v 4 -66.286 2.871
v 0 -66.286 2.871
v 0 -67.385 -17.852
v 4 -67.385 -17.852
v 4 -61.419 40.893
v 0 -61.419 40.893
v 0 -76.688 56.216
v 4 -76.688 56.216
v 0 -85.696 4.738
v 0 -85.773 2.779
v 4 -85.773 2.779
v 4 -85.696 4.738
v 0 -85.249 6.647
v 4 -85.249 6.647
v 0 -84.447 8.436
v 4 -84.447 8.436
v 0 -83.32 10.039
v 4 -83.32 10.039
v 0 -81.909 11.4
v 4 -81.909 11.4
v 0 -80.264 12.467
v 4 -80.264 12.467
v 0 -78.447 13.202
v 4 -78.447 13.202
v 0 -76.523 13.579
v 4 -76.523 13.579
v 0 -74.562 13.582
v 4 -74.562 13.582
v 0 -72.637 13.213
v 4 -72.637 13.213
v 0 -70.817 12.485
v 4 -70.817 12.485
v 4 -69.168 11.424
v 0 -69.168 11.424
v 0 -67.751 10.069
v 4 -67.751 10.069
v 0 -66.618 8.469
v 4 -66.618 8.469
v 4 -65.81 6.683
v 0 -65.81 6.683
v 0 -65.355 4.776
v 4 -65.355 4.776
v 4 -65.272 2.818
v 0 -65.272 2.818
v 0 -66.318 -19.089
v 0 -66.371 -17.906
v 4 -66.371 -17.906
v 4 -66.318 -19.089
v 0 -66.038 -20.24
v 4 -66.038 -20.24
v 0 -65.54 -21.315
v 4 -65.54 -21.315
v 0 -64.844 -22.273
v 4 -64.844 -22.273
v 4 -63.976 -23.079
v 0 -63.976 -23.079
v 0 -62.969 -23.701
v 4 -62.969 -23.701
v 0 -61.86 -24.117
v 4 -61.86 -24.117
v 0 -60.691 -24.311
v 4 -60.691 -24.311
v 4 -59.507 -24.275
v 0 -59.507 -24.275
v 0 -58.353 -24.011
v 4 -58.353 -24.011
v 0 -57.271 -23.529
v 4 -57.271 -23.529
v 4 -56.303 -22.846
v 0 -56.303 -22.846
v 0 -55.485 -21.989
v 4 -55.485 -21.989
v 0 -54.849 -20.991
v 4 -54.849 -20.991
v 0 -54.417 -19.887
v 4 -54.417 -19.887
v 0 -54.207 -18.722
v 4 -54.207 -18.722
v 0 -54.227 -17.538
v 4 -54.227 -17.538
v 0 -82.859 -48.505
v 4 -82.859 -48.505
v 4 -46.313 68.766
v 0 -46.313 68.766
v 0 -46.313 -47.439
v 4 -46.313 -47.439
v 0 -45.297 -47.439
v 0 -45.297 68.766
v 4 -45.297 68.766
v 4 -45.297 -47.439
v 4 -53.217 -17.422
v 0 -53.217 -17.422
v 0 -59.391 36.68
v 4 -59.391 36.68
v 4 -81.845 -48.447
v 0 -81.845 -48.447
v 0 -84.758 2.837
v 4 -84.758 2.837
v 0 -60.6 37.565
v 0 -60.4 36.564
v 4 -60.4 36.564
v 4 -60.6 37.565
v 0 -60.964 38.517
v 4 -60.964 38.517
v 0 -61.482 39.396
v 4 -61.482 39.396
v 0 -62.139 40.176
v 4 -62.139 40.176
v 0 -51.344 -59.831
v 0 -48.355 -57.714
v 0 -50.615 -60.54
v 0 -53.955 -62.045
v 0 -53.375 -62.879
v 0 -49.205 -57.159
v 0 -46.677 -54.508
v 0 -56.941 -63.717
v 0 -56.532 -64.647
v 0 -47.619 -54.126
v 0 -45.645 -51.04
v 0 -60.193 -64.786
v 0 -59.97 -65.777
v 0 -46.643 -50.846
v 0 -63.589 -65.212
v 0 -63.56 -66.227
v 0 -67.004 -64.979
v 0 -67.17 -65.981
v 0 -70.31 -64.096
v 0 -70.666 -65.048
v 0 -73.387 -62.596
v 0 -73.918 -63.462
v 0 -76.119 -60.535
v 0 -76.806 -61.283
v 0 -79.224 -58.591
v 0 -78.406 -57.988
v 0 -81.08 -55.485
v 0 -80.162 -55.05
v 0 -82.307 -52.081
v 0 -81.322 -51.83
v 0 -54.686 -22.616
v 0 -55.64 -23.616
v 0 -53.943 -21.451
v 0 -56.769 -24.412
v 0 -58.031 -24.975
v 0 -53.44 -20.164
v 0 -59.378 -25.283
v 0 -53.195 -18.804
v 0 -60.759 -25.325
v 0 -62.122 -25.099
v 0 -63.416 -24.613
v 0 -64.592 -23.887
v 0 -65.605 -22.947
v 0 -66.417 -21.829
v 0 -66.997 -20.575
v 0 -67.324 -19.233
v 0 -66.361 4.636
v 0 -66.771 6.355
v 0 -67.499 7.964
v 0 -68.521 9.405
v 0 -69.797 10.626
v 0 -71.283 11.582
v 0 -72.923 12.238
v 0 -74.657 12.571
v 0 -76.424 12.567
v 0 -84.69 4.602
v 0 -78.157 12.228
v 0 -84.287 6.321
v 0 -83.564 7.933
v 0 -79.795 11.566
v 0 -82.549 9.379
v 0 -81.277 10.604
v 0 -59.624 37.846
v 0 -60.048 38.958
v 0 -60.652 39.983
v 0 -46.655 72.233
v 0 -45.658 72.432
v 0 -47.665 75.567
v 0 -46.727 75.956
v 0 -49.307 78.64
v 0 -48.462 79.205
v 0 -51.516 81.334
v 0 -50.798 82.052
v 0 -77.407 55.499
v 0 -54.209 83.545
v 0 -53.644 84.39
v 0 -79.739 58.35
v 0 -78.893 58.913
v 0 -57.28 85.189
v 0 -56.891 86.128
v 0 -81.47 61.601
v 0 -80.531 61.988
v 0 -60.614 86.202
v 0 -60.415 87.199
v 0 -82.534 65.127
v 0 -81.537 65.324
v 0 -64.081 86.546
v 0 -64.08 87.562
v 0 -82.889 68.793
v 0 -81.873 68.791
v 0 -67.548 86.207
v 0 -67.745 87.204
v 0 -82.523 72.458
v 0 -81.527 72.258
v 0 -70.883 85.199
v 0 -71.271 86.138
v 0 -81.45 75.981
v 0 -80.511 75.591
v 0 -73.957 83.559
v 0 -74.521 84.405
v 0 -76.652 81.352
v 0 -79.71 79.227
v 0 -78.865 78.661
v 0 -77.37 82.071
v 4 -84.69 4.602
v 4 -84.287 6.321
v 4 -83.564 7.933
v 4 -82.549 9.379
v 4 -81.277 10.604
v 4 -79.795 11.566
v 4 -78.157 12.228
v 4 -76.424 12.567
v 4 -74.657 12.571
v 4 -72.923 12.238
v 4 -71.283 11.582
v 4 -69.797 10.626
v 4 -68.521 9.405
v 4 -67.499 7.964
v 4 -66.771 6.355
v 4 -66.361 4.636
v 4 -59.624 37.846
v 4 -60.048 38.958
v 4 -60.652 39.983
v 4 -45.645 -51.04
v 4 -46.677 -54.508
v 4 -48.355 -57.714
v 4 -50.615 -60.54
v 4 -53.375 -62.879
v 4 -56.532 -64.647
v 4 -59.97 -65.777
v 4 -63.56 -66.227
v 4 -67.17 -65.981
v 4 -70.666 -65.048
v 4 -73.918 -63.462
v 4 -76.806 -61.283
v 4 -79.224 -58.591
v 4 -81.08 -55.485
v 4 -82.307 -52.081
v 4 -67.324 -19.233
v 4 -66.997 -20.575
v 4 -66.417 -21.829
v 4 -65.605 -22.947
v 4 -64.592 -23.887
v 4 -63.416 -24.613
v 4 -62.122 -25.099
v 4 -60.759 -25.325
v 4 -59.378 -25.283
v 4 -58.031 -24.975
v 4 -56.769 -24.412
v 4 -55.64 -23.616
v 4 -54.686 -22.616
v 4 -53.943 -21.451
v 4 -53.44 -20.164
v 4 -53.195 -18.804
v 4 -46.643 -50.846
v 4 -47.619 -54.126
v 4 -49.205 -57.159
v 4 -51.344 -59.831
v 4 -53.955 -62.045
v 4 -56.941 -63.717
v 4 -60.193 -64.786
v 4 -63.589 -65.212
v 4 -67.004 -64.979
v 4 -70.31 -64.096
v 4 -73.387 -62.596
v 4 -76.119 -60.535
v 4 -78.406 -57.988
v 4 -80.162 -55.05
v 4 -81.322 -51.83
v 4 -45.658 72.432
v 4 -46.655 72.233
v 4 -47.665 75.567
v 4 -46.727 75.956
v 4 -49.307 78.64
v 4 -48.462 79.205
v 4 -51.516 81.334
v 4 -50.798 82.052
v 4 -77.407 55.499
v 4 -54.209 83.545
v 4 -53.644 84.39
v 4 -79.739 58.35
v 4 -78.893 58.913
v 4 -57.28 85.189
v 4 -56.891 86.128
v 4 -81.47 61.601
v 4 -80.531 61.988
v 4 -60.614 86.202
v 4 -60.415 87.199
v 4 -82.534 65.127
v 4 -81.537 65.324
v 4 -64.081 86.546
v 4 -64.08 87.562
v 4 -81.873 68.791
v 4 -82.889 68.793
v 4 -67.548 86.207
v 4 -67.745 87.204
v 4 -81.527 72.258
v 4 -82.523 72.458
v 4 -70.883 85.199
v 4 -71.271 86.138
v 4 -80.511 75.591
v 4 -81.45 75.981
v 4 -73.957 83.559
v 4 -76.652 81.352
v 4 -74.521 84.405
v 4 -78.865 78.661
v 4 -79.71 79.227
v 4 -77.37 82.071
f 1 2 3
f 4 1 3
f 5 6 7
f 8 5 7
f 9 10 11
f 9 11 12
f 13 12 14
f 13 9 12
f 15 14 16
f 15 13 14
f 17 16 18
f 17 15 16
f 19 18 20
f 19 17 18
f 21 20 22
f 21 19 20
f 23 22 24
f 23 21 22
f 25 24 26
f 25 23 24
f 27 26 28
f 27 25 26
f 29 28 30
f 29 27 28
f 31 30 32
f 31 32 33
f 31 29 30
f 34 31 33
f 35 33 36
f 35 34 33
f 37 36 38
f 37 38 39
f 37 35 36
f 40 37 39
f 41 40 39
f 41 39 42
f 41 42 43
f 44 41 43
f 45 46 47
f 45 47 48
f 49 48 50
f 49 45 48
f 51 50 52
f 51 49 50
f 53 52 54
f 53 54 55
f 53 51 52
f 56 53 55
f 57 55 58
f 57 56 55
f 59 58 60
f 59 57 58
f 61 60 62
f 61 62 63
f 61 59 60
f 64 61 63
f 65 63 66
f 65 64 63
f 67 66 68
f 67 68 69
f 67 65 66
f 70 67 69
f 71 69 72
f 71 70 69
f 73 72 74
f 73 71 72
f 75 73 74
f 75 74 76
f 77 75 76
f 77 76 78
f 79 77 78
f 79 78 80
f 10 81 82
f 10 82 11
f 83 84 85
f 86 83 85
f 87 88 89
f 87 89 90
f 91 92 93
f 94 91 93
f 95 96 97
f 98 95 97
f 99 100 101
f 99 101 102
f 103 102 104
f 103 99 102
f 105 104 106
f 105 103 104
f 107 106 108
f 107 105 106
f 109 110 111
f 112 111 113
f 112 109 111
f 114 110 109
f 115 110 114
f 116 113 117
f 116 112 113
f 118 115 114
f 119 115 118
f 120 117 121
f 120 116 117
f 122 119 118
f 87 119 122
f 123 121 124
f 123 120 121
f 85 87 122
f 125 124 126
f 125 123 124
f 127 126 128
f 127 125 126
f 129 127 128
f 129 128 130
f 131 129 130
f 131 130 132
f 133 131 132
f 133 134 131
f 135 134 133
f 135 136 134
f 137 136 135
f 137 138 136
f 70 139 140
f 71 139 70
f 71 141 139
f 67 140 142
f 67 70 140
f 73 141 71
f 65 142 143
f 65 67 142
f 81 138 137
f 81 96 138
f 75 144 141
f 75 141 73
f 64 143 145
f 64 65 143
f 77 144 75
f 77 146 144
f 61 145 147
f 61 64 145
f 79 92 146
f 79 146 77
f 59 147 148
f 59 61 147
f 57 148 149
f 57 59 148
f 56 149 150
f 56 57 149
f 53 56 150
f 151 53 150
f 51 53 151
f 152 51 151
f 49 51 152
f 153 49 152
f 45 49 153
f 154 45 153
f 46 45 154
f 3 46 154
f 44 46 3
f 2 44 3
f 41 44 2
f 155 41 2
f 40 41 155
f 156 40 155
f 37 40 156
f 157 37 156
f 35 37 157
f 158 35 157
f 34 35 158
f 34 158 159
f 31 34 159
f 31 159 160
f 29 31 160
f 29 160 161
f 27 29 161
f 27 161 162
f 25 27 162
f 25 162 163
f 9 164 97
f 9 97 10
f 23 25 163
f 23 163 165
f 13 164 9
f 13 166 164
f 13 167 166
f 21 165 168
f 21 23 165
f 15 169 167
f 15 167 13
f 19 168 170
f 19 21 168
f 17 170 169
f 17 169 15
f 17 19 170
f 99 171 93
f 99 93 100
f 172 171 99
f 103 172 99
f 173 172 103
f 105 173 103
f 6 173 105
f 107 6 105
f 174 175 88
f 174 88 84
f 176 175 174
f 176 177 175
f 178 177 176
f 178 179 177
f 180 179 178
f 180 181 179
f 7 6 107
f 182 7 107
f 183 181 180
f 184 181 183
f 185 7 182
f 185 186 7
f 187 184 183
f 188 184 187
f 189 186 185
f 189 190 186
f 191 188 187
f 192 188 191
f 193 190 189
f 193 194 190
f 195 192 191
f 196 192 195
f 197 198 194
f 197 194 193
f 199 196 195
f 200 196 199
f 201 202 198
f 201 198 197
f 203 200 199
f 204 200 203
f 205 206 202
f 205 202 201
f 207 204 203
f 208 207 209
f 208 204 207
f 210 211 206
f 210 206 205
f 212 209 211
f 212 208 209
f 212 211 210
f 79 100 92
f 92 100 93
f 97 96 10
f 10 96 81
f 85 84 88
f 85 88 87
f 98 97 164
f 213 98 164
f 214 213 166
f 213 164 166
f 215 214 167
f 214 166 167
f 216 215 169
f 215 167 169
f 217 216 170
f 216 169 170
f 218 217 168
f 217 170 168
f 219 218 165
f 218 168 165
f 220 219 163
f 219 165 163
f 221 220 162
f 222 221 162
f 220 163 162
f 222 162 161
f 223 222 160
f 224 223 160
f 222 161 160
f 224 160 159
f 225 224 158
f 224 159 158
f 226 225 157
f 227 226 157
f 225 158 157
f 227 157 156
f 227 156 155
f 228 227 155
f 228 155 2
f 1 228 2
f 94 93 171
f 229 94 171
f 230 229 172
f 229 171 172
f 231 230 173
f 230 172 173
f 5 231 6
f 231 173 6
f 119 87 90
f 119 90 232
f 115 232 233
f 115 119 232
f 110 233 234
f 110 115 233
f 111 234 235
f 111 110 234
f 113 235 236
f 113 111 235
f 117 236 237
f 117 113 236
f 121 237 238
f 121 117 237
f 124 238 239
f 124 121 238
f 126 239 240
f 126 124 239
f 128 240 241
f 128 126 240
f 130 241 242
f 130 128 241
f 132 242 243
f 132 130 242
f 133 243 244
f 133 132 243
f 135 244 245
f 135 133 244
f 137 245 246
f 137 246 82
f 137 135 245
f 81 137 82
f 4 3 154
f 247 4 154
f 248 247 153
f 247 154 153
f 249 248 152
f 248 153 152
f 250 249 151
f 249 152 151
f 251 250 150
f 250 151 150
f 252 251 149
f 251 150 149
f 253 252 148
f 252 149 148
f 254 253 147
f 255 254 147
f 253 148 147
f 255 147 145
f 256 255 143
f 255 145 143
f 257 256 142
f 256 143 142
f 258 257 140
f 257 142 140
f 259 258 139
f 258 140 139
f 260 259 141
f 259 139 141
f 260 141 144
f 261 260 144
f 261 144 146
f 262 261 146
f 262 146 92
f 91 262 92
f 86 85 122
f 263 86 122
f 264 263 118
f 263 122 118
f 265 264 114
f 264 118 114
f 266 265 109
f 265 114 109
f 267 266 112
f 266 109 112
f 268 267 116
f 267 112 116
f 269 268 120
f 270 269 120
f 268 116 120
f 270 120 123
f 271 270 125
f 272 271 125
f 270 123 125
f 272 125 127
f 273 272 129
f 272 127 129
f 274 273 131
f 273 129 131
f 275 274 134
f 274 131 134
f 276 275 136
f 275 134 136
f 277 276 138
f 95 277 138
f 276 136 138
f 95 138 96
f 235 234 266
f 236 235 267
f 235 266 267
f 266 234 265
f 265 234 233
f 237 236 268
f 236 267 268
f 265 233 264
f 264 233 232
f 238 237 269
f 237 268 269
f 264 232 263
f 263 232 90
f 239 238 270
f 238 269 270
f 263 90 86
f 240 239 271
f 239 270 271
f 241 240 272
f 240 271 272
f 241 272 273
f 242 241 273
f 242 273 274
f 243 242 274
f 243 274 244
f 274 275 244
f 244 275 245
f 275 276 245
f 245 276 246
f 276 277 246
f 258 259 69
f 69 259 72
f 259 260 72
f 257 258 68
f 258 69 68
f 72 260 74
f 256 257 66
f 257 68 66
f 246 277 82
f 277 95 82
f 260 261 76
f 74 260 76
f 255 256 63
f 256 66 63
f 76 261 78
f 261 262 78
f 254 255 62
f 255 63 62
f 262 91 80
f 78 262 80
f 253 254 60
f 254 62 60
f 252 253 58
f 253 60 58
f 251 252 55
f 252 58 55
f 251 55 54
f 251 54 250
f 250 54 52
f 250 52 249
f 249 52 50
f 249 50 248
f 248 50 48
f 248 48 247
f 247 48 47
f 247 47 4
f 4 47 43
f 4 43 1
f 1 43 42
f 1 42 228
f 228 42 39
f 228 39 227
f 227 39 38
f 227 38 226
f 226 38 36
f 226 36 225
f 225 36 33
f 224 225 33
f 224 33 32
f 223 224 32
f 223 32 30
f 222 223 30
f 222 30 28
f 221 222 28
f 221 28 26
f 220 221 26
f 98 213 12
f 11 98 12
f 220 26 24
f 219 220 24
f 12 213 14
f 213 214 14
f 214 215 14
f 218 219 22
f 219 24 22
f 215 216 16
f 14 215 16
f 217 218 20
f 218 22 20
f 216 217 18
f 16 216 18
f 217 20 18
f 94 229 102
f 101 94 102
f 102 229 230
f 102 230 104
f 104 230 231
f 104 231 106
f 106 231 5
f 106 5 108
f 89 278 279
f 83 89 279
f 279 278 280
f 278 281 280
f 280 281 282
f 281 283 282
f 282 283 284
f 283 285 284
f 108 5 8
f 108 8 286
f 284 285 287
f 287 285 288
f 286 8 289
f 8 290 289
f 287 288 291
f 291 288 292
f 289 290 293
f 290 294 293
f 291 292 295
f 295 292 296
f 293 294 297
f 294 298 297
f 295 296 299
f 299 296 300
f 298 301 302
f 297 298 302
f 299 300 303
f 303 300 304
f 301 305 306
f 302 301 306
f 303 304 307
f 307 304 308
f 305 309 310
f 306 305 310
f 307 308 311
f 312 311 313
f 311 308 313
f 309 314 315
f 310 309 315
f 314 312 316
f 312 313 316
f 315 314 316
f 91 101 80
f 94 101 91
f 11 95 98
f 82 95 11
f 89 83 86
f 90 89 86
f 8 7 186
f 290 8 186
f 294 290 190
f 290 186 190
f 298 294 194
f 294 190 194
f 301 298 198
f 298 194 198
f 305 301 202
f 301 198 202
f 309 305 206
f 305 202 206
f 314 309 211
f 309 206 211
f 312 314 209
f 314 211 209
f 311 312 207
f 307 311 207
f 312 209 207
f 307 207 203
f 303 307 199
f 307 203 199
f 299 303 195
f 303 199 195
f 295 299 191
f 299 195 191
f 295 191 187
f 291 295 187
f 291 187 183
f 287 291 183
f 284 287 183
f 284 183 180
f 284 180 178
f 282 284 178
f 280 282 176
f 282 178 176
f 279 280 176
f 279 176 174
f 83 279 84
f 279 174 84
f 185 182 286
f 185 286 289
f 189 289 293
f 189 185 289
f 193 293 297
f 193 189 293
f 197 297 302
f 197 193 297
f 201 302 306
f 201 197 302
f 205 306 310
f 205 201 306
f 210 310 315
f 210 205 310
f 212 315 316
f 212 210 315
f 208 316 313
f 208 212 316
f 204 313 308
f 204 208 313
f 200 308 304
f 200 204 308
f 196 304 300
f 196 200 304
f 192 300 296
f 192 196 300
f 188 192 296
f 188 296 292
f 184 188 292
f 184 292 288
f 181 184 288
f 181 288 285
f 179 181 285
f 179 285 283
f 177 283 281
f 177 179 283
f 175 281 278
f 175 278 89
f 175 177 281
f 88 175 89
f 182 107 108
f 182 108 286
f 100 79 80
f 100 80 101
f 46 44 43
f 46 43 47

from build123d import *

# Parameters (mm, degrees)
BOSS_EXTRUDE1_DEPTH = 4


with BuildPart() as part:
    # Sketch1 → Boss-Extrude1 (new body)
    with BuildSketch(Plane.YZ):
        with BuildLine():
            Line((-45.297204985, 68.766275416), (-45.297204985, -47.438724583))
            ThreePointArc((-45.297204985, -47.438724583), (-63.559894946, -66.227157099), (-82.858941142, -48.504915228))
            Line((-82.858941142, -48.504915228), (-85.772675501, 2.778943341))
            ThreePointArc((-85.772675501, 2.778943341), (-75.542561207, 13.627257141), (-65.271611457, 2.817597479))
            Line((-65.271611457, 2.817597479), (-66.370650366, -17.905886036))
            ThreePointArc((-66.370650366, -17.905886036), (-60.09842319, -24.321923389), (-54.226508839, -17.537603901))
            Line((-54.226508839, -17.537603901), (-60.400008434, 36.564396099))
            ThreePointArc((-60.400008434, 36.564396099), (-60.963940599, 38.517279926), (-62.138586455, 40.176189762))
            Line((-62.138586455, 40.176189762), (-77.407402535, 55.498956184))
            ThreePointArc((-77.407402535, 55.498956184), (-71.270807609, 86.137850951), (-45.297204985, 68.766275416))
        make_face()
        with BuildLine():
            Line((-81.844577025, -48.447283301), (-84.758311385, 2.836575268))
            ThreePointArc((-84.758311385, 2.836575268), (-75.540645573, 12.611258947), (-66.286185688, 2.871403904))
            Line((-66.286185688, 2.871403904), (-67.385224597, -17.852079611))
            ThreePointArc((-67.385224597, -17.852079611), (-60.067626225, -25.337456524), (-53.217059482, -17.42241712))
            Line((-53.217059482, -17.42241712), (-59.390559076, 36.67958288))
            ThreePointArc((-59.390559076, 36.67958288), (-60.048479935, 38.957947345), (-61.418900101, 40.893342152))
            Line((-61.418900101, 40.893342152), (-76.687716181, 56.216108575))
            ThreePointArc((-76.687716181, 56.216108575), (-70.882829088, 85.198846868), (-46.313204985, 68.766275416))
            Line((-46.313204985, 68.766275416), (-46.313204985, -47.438724583))
            ThreePointArc((-46.313204985, -47.438724583), (-63.588722515, -65.211566152), (-81.844577025, -48.447283301))
        make_face(mode=Mode.SUBTRACT)
    extrude(amount=BOSS_EXTRUDE1_DEPTH)


solid = part.part
